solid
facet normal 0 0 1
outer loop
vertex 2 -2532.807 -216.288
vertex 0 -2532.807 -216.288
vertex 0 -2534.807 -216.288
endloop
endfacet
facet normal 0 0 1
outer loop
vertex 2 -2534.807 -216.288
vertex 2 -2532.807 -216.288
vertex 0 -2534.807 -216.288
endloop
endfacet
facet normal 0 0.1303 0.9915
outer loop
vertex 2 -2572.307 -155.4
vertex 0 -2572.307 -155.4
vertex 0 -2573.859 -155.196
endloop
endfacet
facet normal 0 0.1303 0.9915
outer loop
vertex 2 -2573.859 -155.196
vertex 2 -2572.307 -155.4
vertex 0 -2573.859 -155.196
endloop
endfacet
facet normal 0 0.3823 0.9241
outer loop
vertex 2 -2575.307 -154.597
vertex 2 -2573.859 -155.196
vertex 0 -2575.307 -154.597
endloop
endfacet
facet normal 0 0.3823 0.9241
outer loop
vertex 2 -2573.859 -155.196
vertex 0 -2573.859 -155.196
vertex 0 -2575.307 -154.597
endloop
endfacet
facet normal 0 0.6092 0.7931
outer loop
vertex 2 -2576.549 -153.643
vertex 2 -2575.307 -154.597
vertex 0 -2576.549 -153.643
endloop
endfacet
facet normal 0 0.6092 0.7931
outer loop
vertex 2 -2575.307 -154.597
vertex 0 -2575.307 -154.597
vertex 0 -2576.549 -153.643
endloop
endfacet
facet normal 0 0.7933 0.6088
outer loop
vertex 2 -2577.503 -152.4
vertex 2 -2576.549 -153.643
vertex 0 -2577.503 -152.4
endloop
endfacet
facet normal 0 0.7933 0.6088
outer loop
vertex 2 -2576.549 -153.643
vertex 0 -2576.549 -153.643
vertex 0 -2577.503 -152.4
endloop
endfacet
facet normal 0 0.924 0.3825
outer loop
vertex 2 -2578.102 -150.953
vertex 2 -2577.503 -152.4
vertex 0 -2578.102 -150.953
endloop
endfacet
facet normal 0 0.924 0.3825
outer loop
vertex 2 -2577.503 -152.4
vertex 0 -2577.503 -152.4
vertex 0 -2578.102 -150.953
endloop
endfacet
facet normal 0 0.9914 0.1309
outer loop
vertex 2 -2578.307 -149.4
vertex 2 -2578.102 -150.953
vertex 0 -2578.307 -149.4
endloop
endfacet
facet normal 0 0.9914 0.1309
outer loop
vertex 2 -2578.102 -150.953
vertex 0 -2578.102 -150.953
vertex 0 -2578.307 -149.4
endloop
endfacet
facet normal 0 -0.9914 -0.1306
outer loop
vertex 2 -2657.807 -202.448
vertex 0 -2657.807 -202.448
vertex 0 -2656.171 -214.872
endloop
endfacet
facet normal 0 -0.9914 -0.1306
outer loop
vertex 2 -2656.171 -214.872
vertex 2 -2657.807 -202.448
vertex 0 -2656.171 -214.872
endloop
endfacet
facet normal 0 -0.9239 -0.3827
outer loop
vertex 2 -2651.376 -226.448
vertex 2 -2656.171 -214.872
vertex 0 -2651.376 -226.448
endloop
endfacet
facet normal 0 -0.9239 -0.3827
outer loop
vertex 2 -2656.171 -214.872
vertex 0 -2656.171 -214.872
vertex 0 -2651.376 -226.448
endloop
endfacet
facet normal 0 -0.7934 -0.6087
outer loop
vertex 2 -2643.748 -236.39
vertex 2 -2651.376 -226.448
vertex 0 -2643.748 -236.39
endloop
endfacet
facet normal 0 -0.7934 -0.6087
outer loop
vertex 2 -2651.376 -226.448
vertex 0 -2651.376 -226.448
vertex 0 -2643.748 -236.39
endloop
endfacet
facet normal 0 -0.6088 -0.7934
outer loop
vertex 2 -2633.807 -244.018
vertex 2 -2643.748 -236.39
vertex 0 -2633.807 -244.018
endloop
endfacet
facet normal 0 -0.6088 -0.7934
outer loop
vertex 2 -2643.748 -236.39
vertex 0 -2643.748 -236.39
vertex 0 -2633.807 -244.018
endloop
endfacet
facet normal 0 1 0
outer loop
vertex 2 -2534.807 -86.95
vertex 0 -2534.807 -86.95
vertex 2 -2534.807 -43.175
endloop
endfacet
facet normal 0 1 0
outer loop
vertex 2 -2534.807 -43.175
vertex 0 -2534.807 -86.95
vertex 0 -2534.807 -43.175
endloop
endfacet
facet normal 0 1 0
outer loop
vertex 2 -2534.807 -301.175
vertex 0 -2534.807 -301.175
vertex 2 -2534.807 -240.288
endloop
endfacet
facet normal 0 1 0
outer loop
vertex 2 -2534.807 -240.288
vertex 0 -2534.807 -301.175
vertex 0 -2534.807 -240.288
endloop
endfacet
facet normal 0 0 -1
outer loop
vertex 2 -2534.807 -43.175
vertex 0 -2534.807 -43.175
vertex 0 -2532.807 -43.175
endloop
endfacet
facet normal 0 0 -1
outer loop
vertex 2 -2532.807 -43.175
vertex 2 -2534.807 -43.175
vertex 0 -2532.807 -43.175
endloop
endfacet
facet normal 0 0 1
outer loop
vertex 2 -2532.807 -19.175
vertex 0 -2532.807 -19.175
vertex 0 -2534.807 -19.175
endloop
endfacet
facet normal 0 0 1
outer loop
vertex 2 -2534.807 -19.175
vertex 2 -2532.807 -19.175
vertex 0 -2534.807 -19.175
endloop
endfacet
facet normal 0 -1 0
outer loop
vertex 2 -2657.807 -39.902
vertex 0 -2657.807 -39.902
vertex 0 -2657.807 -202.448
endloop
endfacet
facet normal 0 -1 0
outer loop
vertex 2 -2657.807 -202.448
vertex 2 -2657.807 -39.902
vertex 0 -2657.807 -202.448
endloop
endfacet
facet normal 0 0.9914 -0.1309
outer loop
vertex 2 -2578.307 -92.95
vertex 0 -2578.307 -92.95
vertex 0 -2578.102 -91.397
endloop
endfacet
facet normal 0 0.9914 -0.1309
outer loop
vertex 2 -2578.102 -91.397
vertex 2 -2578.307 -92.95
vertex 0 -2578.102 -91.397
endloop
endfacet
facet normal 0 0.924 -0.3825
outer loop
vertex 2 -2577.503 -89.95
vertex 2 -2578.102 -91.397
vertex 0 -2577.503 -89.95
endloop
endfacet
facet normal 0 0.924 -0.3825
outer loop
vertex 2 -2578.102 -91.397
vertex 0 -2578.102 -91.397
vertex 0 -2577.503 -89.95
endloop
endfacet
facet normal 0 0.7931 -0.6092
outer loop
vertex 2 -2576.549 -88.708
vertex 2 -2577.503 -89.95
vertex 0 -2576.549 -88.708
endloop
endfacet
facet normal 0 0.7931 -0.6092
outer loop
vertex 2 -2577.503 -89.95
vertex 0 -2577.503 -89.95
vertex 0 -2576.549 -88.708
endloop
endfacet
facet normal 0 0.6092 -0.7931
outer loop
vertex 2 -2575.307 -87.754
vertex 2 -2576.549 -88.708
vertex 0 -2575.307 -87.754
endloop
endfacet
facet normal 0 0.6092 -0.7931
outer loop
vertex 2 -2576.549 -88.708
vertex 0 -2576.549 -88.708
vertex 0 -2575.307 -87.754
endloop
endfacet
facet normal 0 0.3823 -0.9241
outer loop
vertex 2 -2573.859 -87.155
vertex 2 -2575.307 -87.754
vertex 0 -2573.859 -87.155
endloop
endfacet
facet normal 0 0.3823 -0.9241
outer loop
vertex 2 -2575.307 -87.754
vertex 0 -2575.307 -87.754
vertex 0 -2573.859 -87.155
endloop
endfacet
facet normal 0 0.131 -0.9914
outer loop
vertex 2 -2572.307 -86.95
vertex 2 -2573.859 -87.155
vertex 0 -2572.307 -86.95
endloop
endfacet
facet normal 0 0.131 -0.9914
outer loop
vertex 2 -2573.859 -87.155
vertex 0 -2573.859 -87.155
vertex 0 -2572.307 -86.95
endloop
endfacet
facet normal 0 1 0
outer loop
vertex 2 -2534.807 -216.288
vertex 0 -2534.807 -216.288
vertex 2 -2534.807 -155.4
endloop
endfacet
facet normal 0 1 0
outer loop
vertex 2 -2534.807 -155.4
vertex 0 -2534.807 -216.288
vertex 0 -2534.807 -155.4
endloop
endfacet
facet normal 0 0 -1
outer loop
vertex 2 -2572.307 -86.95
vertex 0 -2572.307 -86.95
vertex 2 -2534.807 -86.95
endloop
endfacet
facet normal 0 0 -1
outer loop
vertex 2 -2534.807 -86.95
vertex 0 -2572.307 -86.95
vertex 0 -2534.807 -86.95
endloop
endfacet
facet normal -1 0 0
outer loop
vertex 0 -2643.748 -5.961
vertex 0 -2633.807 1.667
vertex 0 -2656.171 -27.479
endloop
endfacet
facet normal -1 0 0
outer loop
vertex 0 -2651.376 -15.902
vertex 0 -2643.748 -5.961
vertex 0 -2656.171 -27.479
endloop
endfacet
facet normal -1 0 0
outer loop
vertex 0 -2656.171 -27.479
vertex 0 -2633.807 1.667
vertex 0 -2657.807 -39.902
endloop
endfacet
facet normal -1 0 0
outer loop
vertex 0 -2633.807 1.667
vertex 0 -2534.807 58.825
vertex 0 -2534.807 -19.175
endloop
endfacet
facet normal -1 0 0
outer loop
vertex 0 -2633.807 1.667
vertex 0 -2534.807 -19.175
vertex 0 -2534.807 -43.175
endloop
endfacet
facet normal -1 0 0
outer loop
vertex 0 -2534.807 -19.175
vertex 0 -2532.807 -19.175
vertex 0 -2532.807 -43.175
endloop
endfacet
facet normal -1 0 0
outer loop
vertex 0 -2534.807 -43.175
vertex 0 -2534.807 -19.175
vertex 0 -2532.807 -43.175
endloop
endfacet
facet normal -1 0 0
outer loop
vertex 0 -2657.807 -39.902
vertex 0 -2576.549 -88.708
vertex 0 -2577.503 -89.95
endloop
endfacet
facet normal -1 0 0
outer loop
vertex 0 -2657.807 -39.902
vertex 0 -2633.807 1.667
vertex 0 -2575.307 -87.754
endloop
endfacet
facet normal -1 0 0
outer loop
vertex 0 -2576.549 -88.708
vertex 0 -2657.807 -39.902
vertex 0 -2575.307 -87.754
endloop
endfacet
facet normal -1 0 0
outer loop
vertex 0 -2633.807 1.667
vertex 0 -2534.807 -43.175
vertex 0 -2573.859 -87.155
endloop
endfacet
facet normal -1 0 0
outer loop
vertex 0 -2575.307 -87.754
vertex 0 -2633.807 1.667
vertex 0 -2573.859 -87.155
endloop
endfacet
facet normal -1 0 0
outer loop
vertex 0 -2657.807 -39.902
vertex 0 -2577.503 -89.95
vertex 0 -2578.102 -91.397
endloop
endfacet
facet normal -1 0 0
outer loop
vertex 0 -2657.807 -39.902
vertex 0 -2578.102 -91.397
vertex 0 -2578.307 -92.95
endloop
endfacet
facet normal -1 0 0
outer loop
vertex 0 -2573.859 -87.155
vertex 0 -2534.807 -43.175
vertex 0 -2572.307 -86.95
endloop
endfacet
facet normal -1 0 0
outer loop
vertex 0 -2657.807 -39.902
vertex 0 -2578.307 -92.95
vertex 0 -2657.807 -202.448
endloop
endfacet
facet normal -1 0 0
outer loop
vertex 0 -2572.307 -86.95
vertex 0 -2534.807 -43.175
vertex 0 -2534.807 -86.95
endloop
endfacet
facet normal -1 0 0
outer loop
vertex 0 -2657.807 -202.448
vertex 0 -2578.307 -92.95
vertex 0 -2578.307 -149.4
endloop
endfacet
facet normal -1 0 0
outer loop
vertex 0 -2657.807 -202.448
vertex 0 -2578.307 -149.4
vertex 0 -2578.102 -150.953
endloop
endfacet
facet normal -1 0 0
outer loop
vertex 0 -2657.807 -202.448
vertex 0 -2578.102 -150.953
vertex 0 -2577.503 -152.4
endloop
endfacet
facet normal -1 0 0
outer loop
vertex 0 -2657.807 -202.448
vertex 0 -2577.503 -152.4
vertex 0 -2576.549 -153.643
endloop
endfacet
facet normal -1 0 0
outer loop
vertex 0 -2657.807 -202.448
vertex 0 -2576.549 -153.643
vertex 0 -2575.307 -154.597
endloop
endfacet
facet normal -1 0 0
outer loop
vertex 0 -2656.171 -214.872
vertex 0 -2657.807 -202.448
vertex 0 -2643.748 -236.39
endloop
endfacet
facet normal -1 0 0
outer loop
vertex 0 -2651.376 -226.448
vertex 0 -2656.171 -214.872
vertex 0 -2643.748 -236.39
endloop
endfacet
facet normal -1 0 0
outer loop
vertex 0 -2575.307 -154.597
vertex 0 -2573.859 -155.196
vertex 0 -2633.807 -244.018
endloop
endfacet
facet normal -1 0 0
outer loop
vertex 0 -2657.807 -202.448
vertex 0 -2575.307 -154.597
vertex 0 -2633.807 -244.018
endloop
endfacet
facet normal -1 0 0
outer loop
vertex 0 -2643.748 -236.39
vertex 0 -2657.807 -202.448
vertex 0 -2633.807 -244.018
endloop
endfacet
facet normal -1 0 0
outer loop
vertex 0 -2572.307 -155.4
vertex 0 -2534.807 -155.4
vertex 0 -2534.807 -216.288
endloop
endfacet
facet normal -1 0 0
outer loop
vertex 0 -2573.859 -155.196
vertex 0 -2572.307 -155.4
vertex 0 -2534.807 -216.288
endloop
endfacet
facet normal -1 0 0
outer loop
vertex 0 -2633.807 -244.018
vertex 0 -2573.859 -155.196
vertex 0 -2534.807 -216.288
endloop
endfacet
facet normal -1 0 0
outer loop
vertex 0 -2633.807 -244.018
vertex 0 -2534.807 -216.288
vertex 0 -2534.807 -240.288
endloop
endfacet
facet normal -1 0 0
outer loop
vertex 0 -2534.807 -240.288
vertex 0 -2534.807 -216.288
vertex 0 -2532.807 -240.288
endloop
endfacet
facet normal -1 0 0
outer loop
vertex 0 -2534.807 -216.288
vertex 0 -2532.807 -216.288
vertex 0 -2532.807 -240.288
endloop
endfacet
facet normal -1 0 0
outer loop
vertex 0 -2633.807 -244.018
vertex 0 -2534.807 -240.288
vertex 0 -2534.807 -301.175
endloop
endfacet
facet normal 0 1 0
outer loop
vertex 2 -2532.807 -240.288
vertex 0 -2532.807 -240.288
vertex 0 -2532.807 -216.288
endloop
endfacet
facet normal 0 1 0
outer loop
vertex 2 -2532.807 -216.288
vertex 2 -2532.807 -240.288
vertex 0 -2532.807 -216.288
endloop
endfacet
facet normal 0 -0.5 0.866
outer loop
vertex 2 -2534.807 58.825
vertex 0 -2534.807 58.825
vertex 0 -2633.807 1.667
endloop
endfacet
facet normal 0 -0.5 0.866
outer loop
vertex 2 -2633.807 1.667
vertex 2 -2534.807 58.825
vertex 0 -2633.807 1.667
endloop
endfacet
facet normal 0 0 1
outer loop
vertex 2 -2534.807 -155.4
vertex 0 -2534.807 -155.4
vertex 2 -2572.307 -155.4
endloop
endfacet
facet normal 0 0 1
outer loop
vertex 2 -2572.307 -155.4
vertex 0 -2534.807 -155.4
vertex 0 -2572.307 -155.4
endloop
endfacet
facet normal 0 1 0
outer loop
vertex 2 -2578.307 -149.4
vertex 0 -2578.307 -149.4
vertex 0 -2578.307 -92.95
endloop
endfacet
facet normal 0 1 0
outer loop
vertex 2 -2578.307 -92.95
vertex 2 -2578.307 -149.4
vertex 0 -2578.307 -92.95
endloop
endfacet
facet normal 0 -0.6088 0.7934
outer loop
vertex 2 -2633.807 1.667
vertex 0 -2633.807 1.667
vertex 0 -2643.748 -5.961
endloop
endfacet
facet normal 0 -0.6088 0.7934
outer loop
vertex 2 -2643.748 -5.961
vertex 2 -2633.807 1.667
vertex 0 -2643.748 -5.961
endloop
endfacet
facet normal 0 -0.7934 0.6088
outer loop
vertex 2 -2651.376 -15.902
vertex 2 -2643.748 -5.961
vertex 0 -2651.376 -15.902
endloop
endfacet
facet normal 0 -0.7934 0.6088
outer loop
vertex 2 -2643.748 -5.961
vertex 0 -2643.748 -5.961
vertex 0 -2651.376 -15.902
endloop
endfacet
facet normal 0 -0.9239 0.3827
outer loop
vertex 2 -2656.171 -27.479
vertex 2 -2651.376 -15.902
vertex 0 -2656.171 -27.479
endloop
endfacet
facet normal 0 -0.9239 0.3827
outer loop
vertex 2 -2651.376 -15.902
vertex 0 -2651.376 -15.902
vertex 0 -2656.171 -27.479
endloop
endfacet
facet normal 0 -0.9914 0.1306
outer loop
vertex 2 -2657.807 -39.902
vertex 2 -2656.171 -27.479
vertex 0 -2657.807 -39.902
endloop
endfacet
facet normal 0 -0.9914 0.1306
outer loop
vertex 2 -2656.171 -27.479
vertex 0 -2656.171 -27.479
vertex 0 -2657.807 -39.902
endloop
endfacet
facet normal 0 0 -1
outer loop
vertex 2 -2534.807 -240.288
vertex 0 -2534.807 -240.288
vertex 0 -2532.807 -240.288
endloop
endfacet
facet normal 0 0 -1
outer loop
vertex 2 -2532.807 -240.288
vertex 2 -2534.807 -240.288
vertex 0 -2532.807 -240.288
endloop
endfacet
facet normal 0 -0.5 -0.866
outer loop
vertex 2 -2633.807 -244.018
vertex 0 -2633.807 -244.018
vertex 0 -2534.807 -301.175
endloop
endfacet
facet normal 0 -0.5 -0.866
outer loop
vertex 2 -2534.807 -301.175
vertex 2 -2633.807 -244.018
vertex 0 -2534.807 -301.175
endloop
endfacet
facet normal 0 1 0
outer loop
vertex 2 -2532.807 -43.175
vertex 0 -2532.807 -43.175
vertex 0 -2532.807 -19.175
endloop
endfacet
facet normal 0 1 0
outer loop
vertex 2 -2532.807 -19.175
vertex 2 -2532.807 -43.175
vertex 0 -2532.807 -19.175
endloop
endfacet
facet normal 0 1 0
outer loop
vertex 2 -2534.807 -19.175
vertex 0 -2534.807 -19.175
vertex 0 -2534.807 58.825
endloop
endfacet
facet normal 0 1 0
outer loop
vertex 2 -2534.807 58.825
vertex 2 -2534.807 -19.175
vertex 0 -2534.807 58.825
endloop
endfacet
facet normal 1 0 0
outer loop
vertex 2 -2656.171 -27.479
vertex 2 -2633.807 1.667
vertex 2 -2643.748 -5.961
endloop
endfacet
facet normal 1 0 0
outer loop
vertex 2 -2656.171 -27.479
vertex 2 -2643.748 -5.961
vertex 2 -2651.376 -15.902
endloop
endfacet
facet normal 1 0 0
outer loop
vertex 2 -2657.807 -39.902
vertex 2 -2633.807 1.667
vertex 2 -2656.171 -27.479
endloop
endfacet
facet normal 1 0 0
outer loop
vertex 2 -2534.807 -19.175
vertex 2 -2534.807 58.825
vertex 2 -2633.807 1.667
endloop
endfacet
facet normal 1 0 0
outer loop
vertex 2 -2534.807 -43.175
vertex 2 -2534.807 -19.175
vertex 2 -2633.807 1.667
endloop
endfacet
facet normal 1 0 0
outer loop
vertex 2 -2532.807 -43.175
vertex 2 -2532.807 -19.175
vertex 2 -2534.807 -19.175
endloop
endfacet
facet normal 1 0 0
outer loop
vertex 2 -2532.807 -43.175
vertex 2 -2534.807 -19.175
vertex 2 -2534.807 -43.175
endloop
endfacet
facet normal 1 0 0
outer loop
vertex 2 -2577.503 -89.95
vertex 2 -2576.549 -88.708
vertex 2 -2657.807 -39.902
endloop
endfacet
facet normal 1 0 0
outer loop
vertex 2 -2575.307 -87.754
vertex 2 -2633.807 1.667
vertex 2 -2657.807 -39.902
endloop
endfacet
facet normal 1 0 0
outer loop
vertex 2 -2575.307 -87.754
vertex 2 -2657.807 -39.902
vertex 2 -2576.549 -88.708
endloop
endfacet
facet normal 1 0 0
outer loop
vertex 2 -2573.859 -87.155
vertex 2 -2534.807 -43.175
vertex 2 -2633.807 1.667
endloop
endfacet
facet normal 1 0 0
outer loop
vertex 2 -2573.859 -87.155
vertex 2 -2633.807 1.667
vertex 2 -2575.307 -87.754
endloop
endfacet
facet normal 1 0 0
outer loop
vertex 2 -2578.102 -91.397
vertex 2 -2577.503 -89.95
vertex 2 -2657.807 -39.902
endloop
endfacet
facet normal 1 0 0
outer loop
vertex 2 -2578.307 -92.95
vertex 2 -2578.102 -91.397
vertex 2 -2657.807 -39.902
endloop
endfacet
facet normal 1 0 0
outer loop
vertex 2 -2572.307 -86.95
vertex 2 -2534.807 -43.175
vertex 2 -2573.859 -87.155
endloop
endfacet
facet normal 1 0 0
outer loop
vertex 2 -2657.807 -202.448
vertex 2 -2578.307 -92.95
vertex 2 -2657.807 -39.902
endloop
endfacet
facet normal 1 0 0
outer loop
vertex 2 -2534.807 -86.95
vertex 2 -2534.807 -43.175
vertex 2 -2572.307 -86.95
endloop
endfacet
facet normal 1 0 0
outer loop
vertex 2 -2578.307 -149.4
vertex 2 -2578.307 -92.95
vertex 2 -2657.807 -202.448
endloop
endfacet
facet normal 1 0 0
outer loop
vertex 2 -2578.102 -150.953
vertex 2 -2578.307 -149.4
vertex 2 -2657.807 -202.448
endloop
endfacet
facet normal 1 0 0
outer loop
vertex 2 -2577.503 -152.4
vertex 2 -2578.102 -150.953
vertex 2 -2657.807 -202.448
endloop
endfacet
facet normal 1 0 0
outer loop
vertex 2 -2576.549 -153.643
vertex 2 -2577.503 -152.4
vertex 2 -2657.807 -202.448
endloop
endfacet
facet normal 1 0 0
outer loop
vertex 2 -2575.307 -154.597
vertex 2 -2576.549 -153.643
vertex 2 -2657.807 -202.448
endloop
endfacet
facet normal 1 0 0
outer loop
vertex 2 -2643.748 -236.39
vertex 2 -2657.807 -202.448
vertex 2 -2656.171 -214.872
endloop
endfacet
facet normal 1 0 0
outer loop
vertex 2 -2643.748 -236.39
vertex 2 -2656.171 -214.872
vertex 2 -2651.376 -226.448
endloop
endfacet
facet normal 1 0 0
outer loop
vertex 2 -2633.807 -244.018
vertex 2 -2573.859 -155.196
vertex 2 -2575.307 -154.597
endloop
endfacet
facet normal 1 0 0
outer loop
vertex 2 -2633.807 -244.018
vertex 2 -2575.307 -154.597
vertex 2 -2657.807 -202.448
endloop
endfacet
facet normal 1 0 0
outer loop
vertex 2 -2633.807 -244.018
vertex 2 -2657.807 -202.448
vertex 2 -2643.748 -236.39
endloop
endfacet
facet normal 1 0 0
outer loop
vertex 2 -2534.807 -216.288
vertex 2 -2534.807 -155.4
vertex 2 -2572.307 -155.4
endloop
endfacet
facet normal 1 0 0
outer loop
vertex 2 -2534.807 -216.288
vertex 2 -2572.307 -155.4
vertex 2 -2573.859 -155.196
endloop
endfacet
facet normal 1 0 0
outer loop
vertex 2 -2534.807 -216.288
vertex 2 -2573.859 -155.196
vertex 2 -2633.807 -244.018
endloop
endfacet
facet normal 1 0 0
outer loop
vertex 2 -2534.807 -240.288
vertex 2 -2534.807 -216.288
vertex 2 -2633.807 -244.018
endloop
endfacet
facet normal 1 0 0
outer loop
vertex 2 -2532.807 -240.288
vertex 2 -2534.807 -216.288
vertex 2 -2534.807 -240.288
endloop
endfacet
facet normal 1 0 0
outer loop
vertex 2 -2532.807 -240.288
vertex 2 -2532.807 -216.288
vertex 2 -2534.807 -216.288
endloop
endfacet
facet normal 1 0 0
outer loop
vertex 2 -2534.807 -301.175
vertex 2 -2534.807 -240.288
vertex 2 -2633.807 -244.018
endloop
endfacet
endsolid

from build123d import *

# Parameters (mm, degrees)
BOSS_EXTRUDE1_DEPTH = 2


with BuildPart() as part:
    # Sketch3 → Boss-Extrude1 (new body)
    with BuildSketch(Plane(origin=(0, 0, 0), x_dir=(0, 0, -1), z_dir=(1, 0, 0))):
        with BuildLine():
            Line((-58.824606693, -2534.80652233), (-1.666930044, -2633.80652233))
            ThreePointArc((-1.666930044, -2633.80652233), (15.902289338, -2651.375741711), (39.902289338, -2657.80652233))
            Line((39.902289338, -2657.80652233), (202.448497275, -2657.80652233))
            ThreePointArc((202.448497275, -2657.80652233), (226.448497275, -2651.375741711), (244.017716657, -2633.80652233))
            Line((244.017716657, -2633.80652233), (301.175393307, -2534.80652233))
            Line((301.175393307, -2534.80652233), (240.287893307, -2534.80652233))
            Line((240.287893307, -2534.80652233), (240.287893307, -2532.80652233))
            Line((240.287893307, -2532.80652233), (216.287893307, -2532.80652233))
            Line((216.287893307, -2532.80652233), (216.287893307, -2534.80652233))
            Line((216.287893307, -2534.80652233), (155.400393307, -2534.80652233))
            Line((155.400393307, -2534.80652233), (155.400393307, -2572.30652233))
            ThreePointArc((155.400393307, -2572.30652233), (153.643033994, -2576.549163017), (149.400393307, -2578.30652233))
            Line((149.400393307, -2578.30652233), (92.950393307, -2578.30652233))
            ThreePointArc((92.950393307, -2578.30652233), (88.70775262, -2576.549163017), (86.950393307, -2572.30652233))
            Line((86.950393307, -2572.30652233), (86.950393307, -2534.80652233))
            Line((86.950393307, -2534.80652233), (43.175393307, -2534.80652233))
            Line((43.175393307, -2534.80652233), (43.175393307, -2532.80652233))
            Line((43.175393307, -2532.80652233), (19.175393307, -2532.80652233))
            Line((19.175393307, -2532.80652233), (19.175393307, -2534.80652233))
            Line((19.175393307, -2534.80652233), (-58.824606693, -2534.80652233))
        make_face()
    extrude(amount=BOSS_EXTRUDE1_DEPTH)


solid = part.part
